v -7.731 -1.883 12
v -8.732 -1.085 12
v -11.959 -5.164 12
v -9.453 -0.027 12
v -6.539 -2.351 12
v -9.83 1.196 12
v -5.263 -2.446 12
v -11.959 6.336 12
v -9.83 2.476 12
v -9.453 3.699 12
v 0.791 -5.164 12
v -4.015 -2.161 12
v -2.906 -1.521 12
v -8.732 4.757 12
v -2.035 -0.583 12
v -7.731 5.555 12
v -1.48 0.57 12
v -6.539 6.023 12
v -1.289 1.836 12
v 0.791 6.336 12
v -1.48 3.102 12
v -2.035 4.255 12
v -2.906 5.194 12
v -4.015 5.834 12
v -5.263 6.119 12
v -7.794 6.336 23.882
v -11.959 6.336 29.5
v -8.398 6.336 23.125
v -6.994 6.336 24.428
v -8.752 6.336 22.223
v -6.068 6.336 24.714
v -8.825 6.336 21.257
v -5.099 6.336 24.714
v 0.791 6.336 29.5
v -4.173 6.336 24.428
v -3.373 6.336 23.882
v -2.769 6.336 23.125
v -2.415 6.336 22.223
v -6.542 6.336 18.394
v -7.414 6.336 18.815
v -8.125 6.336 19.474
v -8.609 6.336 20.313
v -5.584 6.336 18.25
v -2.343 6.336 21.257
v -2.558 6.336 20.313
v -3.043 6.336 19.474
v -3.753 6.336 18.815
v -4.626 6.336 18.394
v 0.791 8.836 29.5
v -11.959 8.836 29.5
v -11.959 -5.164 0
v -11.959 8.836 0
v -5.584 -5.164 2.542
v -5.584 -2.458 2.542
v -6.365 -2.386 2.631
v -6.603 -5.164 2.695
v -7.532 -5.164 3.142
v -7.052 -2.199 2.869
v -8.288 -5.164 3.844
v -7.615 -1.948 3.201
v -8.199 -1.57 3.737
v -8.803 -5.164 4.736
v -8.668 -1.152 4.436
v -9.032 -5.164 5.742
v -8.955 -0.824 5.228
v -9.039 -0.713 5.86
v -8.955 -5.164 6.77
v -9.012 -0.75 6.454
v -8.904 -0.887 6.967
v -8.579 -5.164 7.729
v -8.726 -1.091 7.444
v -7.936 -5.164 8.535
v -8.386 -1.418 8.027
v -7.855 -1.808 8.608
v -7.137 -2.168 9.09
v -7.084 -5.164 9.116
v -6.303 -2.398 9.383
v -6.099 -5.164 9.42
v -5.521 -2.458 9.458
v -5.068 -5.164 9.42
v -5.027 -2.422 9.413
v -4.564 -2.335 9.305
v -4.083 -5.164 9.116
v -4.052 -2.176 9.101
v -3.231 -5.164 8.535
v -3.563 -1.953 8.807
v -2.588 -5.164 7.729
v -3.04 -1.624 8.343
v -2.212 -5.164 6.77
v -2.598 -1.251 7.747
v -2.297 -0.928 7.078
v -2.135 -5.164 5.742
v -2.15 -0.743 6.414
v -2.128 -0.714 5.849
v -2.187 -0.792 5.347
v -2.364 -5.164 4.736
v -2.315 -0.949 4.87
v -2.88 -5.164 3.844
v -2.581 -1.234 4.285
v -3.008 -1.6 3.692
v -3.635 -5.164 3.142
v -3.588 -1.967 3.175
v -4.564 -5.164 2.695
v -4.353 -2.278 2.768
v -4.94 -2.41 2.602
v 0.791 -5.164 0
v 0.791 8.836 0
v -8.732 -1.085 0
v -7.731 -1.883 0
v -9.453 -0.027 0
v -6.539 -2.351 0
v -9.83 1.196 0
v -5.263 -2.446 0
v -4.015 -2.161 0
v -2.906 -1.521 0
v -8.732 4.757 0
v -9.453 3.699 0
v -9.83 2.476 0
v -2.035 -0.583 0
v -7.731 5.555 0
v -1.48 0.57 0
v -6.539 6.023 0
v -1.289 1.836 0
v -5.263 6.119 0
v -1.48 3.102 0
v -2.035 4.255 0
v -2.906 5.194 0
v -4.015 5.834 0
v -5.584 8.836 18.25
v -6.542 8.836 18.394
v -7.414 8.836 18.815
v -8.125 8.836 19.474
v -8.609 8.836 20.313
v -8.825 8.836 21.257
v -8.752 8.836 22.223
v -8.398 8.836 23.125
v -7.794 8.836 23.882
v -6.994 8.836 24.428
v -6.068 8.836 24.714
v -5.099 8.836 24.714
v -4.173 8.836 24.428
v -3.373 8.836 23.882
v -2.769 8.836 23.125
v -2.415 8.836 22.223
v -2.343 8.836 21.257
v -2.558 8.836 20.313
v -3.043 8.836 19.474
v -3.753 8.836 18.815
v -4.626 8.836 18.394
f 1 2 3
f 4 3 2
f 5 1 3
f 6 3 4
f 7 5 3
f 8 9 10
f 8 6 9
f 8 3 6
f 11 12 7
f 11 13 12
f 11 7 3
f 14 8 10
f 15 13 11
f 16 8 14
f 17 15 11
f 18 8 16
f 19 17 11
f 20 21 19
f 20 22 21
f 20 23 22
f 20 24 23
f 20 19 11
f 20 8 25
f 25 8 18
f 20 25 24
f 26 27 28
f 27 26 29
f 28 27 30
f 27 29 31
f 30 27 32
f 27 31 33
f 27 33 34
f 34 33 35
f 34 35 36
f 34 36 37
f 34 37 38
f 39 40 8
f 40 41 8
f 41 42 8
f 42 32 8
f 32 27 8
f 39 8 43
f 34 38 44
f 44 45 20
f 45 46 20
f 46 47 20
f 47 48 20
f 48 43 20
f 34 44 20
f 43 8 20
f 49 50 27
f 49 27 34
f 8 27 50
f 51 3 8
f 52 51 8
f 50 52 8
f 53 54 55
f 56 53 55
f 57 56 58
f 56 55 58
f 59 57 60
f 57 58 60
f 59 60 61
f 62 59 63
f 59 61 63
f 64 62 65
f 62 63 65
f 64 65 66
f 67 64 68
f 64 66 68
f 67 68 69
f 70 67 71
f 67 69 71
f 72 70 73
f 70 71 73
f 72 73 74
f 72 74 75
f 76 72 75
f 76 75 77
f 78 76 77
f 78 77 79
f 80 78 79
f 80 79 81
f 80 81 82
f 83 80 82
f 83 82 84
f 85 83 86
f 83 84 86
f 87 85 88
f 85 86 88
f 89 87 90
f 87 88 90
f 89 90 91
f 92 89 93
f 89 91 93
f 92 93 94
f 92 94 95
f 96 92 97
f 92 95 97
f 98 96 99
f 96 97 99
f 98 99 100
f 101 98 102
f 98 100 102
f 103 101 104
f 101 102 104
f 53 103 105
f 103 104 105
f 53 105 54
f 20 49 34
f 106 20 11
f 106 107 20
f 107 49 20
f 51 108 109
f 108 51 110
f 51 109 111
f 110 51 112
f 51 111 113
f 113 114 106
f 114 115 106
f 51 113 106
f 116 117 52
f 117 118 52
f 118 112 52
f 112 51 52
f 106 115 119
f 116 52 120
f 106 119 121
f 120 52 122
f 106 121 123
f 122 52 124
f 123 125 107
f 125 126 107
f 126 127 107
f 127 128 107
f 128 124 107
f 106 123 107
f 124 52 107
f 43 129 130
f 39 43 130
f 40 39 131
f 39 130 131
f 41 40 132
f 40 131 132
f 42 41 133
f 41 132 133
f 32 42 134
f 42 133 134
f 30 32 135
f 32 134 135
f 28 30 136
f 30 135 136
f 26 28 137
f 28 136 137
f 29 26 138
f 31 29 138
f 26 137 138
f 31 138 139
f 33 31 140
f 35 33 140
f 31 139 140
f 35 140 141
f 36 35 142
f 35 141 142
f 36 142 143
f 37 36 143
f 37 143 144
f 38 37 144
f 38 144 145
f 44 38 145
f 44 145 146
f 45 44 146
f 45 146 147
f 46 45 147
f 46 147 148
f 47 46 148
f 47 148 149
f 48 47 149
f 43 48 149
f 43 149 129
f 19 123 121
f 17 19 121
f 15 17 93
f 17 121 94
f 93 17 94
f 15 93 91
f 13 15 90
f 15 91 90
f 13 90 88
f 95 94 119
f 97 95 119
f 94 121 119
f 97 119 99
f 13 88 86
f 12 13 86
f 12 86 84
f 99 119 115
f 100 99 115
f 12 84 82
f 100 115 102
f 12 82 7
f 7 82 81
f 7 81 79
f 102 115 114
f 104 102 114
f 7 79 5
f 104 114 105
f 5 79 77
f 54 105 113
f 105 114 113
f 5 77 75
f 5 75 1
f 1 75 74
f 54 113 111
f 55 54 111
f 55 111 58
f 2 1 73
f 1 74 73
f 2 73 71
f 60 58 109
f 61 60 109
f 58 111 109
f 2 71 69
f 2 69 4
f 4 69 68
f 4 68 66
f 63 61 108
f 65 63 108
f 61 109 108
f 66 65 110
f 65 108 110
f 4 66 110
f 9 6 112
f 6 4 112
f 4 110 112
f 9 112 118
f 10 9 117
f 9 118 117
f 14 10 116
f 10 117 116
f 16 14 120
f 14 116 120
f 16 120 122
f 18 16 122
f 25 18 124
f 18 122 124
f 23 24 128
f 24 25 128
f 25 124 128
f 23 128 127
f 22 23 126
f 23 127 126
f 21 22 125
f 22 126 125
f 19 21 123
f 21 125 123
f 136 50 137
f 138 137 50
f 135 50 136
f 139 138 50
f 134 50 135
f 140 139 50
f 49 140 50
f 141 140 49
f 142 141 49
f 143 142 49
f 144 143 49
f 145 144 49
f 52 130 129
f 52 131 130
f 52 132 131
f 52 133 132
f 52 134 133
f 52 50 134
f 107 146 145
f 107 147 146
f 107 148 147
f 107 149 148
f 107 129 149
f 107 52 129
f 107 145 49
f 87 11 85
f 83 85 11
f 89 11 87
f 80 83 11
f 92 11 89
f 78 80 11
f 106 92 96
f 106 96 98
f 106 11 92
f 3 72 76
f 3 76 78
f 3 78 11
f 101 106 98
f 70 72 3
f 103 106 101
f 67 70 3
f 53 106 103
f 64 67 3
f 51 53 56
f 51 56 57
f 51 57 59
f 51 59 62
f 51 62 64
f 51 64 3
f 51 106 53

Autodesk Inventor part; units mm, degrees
ref_plane "YZ Plane" through (0, 0, 0) normal (1, 0, 0) x (0, 1, 0)
ref_plane "XZ Plane" through (0, 0, 0) normal (0, 1, 0) x (-1, 0, 0)
ref_plane "XY Plane" through (0, 0, 0) normal (0, 0, 1) x (1, 0, 0)
sketch "Sketch1" plane through (0, 0, 0) normal (0, 0, 1) x (1, 0, 0)
  line L0 (-11.9586, 8.8362) -> (0.7914, 8.8362)
  line L1 (0.7914, 8.8362) -> (0.7914, -5.1638)
  line L2 (0.7914, -5.1638) -> (-11.9586, -5.1638)
  line L3 (-11.9586, -5.1638) -> (-11.9586, 8.8362)
  circle A0 centre (-5.5836, 1.8362) radius 4.2944
  dimension "d0" = 12.75
  dimension "d1" = 14
  dimension "d2" = 6.375
  dimension "d3" = 7
extrude "Extrusion1" add sketch "Sketch1" along normal blind 12
sketch "Sketch2" plane through (0, 0, 12) normal (0, 0, 1) x (1, 0, 0)
  line L0 (0.7914, 8.8362) -> (0.7914, -5.1638) projected
  line L1 (-11.9586, 8.8362) -> (0.7914, 8.8362) projected
  line L2 (-11.9586, -5.1638) -> (-11.9586, 8.8362) projected
  line L3 (-11.9586, 6.3362) -> (0.7914, 6.3362)
  dimension "d7" = 2.5
extrude "Extrusion2" add sketch "Sketch2" along normal blind 17.5
sketch "Sketch3" plane through (-11.9586, 6.3362, 12) normal (0, -1, 0) x (1, 0, 0)
  line L0 (12.75, 17.5) -> (0, 17.5) projected
  line L1 (0, 0) -> (0, 17.5) projected
  point P0 (6.375, 9.5)
  dimension "d10" = 8
  dimension "d11" = 6.375
hole "Hole1" at (-5.5836, 6.3362, 21.5) direction (0, 1, 0) diameter 6.5 end through all
sketch "Sketch4" plane through (-11.9586, -5.1638, 0) normal (0, -1, 0) x (1, 0, 0)
  line L0 (12.75, 12) -> (0, 12) projected
  line L1 (0, 0) -> (0, 12) projected
  point P0 (6.375, 6)
  dimension "d19" = 6.375
  dimension "d20" = 6
hole "Hole2" at (-5.5836, -5.1638, 6) direction (0, 1, 0) diameter 6.917 depth 7 tip angle 118 thread size "M8x1" class "6H" standard "ANSI Metric M Profile"
equation "\"d2\" = 0.5 * d0"
equation "\"d3\" = 0.5 * d1"
equation "\"d11\" = 0.5 * d0"
equation "\"d19\" = 0.5 * d0"
properties part number "Terminal Battery" material "Copper"
